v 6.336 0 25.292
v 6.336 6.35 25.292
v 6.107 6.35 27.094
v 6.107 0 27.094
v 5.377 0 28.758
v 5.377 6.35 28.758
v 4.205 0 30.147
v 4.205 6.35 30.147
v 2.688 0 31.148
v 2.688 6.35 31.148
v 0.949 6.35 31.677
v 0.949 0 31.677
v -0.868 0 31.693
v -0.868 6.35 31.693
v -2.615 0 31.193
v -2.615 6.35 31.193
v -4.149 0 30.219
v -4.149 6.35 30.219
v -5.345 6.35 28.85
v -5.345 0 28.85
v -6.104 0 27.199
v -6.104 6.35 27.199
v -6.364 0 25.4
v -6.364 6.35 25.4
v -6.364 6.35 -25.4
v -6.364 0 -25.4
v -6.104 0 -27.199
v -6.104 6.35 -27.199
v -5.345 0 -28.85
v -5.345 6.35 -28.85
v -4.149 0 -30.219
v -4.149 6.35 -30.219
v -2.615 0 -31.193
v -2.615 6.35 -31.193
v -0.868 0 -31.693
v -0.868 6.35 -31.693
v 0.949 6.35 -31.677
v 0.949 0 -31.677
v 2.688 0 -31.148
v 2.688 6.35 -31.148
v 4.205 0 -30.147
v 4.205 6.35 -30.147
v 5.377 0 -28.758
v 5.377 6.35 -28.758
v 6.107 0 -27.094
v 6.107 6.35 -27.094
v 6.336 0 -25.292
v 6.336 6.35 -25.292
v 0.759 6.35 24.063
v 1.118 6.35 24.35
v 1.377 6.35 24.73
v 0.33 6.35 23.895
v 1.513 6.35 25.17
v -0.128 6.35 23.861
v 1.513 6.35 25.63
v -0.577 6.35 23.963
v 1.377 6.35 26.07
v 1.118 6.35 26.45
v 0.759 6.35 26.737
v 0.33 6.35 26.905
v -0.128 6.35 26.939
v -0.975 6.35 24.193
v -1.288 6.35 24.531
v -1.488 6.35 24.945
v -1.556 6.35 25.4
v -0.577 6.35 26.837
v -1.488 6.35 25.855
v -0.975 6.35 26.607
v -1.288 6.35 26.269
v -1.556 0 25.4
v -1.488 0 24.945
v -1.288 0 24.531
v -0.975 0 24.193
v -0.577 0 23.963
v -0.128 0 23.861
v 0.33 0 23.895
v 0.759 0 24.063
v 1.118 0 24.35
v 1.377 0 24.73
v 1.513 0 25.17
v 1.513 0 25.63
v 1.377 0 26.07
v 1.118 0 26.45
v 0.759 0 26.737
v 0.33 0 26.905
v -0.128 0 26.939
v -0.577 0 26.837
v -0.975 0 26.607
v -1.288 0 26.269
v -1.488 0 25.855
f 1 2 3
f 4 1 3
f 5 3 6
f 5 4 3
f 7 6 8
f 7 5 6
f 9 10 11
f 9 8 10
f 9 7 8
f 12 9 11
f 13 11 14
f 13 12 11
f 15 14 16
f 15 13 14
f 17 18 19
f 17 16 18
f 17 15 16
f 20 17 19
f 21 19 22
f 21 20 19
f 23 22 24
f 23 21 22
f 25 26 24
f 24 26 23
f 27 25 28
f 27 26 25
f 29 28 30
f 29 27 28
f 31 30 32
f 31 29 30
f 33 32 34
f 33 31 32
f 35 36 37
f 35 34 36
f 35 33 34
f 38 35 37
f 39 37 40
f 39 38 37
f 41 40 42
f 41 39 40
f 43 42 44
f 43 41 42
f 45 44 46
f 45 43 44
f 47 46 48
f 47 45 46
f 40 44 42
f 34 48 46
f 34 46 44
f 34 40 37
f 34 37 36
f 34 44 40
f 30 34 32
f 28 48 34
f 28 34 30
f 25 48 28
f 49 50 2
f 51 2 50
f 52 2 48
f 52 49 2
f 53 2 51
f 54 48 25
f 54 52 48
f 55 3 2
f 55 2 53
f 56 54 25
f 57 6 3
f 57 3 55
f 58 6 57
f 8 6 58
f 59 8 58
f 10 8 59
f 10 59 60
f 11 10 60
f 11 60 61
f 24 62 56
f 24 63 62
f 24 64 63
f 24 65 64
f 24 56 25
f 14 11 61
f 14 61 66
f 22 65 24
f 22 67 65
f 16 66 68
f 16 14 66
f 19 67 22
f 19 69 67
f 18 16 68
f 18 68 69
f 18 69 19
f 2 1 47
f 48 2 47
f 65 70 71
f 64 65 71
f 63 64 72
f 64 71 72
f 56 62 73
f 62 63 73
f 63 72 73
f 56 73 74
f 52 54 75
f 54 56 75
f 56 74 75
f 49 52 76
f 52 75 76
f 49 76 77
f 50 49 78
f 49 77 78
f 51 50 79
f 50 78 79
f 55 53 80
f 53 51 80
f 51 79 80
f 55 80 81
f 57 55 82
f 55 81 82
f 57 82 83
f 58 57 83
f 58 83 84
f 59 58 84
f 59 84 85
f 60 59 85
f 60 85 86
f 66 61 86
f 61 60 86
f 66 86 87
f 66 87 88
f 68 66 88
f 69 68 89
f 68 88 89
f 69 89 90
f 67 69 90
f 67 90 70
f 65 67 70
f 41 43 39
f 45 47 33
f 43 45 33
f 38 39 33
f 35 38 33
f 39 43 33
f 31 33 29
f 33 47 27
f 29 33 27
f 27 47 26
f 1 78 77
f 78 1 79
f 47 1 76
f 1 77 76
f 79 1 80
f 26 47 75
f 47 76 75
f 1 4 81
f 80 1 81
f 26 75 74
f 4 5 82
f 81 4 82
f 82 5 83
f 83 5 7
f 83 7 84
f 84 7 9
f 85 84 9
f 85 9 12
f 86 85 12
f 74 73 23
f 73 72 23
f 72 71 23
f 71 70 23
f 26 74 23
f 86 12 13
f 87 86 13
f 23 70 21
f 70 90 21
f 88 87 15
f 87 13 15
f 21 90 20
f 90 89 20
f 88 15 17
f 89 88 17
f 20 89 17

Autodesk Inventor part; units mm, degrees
ref_plane "YZ Plane" through (0, 0, 0) normal (1, 0, 0) x (0, 1, 0)
ref_plane "XZ Plane" through (0, 0, 0) normal (0, 1, 0) x (-1, 0, 0)
ref_plane "XY Plane" through (0, 0, 0) normal (0, 0, 1) x (1, 0, 0)
sketch "Sketch1" plane through (0, 0, 0) normal (0, 1, 0) x (-1, 0, 0)
  line L0 (6.3636, -25.4) -> (6.3636, 25.4)
  line L1 (-6.3364, 25.2915) -> (-6.3364, -25.2915)
  line L2 (-6.3364, -25.2915) -> (6.3636, 25.4) construction
  line L3 (6.3636, -25.4) -> (-6.3364, 25.2915) construction
  arc A0 (6.3636, 25.4) -> (-6.3364, 25.2915) centre (0.0131, 25.4) ccw
  arc A1 (-6.3364, -25.2915) -> (6.3636, -25.4) centre (0.0131, -25.4) ccw
  circle A2 centre (0.0131, 25.4) radius 1.5434
  point P0 (0, 0)
  dimension "d0" = 50.8
  dimension "d1" = 12.7
extrude "Extrusion1" add sketch "Sketch1" along normal blind 6.35
properties part number "Fixture_Lever"
